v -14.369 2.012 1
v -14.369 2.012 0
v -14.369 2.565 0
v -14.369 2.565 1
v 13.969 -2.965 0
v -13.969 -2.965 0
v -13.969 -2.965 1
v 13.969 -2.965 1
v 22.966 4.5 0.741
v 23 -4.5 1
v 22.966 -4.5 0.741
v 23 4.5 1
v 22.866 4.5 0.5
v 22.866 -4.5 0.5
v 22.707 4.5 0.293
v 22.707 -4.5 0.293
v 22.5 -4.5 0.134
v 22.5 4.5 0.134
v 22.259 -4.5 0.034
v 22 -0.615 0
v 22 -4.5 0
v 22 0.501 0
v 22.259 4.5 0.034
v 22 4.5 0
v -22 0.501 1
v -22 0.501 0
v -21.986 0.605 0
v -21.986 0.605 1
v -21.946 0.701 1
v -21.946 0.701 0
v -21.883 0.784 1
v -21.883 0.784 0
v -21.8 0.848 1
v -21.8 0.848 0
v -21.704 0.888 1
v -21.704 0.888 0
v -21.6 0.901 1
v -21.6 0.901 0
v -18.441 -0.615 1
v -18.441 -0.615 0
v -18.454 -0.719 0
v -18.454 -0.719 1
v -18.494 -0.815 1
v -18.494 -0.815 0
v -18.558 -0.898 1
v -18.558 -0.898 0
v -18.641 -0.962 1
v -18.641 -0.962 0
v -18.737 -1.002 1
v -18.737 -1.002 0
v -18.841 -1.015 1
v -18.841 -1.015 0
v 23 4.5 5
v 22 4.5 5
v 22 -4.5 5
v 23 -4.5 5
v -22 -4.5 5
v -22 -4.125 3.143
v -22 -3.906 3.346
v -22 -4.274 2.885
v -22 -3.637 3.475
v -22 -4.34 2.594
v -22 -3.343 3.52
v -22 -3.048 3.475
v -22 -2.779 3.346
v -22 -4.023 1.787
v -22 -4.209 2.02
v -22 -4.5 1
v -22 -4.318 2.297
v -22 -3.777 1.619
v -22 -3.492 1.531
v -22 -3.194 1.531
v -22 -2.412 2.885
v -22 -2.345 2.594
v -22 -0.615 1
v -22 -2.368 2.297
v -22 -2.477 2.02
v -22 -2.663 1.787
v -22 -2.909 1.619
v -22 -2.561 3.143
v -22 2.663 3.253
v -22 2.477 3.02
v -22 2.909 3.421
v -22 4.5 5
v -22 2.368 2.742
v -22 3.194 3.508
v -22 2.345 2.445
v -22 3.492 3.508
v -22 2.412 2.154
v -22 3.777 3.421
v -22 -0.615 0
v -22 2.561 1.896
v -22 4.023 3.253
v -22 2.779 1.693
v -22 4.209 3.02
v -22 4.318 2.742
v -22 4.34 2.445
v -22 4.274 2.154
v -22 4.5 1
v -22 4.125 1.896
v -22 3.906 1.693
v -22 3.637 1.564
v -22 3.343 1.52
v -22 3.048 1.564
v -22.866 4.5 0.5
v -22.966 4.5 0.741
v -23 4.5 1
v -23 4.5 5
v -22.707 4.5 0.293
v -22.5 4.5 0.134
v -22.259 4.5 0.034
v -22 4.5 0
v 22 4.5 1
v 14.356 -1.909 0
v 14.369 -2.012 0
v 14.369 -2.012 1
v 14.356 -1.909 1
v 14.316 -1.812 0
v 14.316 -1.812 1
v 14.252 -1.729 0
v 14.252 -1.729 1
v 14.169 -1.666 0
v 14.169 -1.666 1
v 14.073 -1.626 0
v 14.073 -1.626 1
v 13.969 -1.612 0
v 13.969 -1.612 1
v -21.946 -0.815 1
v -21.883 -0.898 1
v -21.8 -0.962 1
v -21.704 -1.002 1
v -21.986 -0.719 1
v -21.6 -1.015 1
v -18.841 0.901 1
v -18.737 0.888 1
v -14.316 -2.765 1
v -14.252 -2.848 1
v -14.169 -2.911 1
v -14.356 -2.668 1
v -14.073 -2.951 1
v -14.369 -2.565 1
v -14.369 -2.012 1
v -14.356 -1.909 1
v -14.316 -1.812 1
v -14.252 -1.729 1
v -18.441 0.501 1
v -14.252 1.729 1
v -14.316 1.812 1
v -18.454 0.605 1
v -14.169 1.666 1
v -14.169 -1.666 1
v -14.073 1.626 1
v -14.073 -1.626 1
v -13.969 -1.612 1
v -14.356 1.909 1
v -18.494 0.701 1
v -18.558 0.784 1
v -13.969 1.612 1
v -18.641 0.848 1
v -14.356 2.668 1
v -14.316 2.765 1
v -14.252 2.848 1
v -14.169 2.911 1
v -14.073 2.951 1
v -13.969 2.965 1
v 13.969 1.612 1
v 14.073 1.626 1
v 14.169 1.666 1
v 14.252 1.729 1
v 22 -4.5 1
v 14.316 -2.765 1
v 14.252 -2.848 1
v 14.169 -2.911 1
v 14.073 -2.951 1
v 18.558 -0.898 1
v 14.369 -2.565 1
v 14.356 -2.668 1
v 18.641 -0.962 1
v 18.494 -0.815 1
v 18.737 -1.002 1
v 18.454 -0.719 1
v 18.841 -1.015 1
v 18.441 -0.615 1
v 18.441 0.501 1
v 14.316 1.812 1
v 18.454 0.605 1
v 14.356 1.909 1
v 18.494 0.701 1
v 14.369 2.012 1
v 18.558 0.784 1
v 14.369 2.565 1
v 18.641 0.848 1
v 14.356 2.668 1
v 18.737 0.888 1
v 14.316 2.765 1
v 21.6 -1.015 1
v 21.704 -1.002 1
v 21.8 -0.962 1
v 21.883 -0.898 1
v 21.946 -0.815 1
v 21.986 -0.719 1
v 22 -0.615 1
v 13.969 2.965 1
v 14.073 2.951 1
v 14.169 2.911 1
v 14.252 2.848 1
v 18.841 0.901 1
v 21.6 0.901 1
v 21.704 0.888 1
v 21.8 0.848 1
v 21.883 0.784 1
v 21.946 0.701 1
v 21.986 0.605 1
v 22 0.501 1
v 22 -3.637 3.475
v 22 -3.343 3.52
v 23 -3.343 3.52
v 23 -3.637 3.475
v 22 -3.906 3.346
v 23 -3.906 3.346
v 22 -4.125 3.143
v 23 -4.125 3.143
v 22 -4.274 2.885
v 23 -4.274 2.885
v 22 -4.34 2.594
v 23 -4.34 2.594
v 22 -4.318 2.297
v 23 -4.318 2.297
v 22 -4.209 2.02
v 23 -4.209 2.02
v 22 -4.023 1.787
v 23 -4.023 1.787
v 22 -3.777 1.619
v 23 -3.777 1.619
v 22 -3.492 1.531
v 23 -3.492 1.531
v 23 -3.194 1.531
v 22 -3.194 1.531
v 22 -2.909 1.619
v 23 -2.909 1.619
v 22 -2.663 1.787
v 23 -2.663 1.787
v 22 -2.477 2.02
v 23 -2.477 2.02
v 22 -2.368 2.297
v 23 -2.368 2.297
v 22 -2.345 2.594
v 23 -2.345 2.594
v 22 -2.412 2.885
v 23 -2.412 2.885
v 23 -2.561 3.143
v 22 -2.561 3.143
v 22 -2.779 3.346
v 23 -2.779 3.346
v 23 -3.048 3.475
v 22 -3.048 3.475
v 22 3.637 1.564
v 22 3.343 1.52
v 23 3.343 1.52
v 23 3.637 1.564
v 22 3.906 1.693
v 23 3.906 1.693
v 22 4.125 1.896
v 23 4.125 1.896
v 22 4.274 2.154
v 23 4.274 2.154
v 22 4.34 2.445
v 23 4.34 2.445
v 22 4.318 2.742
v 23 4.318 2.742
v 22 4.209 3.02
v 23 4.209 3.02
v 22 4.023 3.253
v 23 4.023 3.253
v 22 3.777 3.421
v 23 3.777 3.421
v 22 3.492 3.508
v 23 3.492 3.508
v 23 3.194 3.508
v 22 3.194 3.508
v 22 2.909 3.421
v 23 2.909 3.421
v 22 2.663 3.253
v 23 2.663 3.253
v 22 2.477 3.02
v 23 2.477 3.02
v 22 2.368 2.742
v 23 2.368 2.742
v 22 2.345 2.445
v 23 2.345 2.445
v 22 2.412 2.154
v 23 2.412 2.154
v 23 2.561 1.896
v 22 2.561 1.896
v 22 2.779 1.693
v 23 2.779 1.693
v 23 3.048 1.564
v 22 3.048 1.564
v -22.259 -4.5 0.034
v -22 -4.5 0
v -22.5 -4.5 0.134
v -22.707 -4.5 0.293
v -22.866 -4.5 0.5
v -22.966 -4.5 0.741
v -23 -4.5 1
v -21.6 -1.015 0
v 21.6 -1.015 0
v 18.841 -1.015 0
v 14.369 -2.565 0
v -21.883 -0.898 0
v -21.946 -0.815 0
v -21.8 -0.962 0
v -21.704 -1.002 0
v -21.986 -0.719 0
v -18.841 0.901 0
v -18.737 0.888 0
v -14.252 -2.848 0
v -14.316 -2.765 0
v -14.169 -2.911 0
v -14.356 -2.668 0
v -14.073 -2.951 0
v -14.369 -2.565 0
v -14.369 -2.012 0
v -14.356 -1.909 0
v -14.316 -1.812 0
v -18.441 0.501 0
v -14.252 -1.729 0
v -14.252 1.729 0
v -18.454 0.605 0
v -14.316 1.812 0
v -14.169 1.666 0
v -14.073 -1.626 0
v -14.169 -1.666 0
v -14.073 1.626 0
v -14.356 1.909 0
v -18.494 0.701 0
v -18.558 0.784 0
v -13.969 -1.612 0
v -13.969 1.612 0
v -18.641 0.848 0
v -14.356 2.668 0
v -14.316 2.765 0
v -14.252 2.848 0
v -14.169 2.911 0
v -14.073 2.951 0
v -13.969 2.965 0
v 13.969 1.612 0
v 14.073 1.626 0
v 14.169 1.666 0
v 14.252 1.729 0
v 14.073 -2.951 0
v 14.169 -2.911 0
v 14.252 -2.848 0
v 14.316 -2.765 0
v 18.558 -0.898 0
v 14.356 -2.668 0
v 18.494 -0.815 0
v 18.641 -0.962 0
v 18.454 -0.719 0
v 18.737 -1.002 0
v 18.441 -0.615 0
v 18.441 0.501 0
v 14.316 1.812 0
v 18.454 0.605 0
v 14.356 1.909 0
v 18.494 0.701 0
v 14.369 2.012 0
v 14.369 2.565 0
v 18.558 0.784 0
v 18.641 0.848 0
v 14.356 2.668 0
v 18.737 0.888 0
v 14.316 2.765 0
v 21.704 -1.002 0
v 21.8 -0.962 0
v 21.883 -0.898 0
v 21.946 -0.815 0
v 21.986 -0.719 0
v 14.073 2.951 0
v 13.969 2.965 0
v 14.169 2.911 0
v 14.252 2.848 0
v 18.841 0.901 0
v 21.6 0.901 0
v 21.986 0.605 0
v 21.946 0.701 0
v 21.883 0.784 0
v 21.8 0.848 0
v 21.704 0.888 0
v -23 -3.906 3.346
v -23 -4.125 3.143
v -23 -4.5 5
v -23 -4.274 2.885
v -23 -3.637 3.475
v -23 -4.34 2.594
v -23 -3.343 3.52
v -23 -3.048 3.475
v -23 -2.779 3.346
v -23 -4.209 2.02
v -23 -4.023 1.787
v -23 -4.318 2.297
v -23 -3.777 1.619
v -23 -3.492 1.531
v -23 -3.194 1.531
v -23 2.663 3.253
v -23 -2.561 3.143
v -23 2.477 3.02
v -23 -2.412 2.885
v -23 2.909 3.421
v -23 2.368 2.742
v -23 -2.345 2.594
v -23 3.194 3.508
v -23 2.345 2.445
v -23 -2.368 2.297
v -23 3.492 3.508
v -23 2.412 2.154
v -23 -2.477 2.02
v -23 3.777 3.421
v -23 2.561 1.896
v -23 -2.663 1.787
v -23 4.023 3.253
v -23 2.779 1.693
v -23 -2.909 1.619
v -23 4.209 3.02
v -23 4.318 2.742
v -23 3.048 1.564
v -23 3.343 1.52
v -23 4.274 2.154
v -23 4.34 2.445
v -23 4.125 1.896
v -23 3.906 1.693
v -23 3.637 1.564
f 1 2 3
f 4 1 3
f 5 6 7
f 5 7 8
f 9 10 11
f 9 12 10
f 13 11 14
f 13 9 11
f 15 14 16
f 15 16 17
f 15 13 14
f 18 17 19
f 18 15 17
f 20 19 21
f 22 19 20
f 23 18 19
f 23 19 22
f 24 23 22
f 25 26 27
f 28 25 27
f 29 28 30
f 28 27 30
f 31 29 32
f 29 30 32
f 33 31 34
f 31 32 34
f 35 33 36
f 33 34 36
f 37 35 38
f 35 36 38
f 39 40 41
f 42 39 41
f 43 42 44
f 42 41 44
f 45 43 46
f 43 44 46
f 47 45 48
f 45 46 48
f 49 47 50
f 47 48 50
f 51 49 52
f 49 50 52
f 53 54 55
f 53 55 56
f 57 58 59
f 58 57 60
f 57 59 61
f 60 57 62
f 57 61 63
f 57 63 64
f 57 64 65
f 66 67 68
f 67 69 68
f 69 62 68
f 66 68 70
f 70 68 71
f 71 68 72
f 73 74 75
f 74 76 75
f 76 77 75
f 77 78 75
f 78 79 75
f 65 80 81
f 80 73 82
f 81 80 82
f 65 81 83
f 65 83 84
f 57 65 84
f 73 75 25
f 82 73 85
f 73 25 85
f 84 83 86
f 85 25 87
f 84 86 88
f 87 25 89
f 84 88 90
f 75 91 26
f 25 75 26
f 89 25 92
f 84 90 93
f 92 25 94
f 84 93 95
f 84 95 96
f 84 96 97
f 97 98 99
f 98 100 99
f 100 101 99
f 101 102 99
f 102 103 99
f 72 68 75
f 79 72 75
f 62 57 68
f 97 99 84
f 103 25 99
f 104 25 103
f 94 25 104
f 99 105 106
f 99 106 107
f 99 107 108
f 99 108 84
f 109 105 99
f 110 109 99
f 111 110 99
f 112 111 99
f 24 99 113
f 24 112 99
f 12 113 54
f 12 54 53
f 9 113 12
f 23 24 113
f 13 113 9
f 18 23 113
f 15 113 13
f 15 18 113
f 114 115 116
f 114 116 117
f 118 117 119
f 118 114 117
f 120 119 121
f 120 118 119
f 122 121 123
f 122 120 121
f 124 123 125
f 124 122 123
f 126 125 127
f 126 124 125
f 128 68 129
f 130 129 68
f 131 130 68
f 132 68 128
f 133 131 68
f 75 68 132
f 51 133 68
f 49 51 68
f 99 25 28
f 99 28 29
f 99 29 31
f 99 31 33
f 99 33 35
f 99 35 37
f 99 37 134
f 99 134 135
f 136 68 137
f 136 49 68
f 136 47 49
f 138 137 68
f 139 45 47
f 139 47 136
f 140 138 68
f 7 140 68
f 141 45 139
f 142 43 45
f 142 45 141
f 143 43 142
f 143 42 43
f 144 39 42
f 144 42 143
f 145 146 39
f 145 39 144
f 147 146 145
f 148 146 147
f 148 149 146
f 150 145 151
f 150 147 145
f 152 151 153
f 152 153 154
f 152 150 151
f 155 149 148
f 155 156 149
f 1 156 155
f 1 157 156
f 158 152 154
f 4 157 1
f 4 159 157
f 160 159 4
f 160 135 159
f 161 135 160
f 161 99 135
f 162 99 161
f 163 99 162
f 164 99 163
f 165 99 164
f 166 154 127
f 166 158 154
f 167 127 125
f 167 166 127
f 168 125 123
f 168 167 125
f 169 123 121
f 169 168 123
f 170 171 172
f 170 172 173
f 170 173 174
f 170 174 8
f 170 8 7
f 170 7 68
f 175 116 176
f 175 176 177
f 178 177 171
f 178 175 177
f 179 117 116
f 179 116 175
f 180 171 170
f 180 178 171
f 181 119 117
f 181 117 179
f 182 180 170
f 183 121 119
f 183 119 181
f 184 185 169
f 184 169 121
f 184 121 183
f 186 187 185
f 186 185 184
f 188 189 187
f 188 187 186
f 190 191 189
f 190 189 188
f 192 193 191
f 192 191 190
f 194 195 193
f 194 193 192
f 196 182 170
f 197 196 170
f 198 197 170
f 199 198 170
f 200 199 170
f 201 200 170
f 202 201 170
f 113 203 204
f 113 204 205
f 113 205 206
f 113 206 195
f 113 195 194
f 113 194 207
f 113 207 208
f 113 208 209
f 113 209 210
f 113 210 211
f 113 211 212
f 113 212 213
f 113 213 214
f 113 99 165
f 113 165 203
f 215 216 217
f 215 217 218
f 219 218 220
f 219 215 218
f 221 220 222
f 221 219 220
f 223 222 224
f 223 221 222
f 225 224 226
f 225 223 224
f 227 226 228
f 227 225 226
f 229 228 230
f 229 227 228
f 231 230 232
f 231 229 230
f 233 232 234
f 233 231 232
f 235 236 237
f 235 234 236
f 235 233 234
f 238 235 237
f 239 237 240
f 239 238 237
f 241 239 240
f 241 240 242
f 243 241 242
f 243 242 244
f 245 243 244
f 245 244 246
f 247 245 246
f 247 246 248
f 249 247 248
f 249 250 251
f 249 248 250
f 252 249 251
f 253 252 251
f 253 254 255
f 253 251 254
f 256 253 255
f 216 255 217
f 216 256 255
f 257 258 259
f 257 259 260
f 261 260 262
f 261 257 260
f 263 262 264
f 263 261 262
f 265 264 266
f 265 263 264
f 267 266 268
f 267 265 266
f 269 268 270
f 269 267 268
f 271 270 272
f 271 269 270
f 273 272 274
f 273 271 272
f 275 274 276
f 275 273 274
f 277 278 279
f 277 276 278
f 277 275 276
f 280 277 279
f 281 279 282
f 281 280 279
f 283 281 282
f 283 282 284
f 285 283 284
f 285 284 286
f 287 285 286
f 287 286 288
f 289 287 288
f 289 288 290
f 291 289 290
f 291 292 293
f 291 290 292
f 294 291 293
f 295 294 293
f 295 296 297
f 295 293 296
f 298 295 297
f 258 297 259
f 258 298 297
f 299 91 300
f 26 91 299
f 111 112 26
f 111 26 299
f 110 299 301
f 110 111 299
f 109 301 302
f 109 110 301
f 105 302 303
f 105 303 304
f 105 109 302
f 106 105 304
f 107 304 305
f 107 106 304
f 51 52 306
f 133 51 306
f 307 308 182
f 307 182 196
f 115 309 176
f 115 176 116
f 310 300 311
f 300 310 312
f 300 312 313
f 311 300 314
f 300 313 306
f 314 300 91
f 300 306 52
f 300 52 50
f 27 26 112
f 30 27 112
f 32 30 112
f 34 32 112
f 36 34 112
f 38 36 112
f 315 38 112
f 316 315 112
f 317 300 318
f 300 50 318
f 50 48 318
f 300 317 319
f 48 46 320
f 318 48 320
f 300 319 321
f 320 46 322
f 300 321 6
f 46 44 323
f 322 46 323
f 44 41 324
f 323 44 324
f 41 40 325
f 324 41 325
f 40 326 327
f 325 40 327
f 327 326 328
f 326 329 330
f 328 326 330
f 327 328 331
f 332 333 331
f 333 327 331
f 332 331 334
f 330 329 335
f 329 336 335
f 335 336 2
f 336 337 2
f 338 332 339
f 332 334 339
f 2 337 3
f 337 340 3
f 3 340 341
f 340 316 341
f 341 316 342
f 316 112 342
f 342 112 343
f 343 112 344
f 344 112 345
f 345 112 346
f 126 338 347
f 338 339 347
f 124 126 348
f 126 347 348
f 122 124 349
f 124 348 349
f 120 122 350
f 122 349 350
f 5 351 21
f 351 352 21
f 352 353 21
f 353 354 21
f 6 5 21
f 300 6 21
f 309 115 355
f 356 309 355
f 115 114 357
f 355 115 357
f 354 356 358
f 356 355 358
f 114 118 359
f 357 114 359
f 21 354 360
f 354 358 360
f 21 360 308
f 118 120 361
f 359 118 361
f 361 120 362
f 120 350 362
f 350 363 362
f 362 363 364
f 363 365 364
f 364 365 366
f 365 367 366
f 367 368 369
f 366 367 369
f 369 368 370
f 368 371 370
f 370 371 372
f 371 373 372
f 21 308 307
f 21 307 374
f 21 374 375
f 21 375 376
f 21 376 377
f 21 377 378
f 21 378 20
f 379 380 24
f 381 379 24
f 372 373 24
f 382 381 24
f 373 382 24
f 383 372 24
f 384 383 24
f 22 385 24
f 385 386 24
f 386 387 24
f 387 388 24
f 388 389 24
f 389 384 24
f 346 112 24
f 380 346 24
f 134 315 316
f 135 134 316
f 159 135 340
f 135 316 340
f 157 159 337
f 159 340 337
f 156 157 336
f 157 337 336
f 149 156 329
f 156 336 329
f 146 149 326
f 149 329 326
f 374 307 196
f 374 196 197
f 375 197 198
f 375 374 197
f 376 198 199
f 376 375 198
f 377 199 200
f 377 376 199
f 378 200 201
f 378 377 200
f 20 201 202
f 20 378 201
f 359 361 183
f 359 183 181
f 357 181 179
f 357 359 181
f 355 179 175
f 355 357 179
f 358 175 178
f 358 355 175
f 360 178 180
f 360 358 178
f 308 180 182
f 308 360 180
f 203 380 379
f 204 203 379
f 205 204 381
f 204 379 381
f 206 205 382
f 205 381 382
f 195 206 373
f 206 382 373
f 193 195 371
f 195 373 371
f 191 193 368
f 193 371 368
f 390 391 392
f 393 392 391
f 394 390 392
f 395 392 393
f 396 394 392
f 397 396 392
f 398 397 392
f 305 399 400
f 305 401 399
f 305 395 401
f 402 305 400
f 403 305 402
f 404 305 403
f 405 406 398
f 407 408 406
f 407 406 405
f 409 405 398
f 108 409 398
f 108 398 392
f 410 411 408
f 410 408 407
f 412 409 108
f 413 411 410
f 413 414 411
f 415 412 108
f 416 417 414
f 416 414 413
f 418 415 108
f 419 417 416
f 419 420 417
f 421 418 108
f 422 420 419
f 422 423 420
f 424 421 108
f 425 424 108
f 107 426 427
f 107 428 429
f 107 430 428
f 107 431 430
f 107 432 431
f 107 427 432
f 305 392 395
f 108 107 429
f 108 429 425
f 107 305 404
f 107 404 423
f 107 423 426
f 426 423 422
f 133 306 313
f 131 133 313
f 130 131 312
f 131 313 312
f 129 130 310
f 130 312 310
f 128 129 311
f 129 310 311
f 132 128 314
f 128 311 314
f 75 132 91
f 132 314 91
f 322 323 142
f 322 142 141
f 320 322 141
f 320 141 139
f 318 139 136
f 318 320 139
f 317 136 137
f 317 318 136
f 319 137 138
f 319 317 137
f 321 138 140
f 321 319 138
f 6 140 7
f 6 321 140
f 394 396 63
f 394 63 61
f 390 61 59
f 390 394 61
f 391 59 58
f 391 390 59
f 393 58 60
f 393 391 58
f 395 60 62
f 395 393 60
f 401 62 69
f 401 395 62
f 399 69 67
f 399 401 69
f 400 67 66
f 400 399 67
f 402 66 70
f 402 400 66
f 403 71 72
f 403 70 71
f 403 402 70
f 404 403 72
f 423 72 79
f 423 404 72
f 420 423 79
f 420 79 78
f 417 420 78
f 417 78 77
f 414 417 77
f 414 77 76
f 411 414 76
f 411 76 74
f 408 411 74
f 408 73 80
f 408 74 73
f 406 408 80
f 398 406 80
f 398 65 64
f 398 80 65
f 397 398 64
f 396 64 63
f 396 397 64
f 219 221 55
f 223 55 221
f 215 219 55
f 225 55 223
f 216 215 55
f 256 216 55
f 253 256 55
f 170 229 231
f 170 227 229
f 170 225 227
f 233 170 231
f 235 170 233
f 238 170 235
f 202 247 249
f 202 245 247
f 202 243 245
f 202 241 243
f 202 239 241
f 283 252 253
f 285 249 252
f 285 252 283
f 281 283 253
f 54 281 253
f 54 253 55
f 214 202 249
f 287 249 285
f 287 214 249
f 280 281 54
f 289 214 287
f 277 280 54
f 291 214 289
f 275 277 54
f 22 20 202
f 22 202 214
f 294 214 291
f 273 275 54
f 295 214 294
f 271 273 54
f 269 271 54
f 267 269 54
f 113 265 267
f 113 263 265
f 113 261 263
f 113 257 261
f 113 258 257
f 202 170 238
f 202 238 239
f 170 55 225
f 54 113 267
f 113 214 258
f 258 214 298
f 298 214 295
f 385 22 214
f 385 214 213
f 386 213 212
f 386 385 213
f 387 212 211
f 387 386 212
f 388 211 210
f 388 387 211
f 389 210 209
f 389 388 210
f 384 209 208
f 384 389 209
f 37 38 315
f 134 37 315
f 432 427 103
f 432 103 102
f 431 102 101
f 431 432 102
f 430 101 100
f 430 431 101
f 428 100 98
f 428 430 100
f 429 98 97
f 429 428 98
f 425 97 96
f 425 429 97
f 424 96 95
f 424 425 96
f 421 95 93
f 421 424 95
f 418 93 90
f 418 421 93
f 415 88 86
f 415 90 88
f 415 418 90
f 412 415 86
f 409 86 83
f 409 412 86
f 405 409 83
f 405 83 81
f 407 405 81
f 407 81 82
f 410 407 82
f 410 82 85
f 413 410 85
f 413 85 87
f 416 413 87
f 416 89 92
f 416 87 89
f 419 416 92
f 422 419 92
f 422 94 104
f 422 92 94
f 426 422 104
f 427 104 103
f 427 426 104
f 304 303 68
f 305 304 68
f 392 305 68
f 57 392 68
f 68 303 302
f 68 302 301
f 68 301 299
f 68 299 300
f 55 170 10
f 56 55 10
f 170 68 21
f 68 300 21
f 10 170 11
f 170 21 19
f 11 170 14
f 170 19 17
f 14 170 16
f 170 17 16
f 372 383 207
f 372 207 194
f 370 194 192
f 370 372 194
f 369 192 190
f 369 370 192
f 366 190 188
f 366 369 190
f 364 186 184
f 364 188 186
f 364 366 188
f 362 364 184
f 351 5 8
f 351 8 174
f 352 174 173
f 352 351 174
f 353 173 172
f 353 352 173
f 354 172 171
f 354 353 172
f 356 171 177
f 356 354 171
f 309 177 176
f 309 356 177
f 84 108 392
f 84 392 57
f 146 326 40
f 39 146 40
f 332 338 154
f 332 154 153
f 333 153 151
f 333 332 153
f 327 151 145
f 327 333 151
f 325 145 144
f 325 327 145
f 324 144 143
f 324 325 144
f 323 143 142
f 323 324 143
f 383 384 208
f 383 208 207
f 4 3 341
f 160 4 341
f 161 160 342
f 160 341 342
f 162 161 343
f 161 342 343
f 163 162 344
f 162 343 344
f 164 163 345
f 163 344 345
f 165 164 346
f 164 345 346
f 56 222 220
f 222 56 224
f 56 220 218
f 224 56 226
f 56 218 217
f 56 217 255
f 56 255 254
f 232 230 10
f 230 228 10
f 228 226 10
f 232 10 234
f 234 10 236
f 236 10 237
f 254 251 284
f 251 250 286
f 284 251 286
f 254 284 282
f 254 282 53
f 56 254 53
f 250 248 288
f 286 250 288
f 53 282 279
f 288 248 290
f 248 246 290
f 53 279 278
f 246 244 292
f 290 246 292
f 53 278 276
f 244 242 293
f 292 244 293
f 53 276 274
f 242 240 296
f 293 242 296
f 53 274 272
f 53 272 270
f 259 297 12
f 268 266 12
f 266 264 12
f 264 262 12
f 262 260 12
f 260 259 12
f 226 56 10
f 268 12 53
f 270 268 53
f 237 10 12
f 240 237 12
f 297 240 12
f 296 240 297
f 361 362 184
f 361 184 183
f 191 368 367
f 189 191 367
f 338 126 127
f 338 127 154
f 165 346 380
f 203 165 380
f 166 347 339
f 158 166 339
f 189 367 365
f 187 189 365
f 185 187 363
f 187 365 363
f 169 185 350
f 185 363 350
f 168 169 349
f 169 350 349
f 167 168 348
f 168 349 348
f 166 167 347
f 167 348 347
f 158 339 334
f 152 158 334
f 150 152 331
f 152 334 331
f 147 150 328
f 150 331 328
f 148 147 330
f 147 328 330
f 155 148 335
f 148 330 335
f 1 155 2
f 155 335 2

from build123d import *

# Parameters (mm, degrees)
SKETCH1_W               = 46
SKETCH1_H               = 9
BOSS_EXTRUDE1_DEPTH     = 1
SKETCH2_W               = 1
SKETCH2_H               = 9
BOSS_EXTRUDE2_DEPTH     = 4
CUT_EXTRUDE1_DEPTH      = 47.489246068
CUT_EXTRUDE1_DEPTH_BACK = 47.489246068
SKETCH3_R               = 1
FILLET1_R               = 1
CUT_EXTRUDE2_DEPTH      = 4


with BuildPart() as part:
    # Sketch1 → Boss-Extrude1 (new body)
    with BuildSketch(Plane.XY):
        Rectangle(SKETCH1_W, SKETCH1_H)
    extrude(amount=BOSS_EXTRUDE1_DEPTH)

    # Sketch2 → Boss-Extrude2 (add)
    with BuildSketch(Plane.XY.offset(1)):
        with Locations((22.5, 0)):
            Rectangle(SKETCH2_W, SKETCH2_H)
        with Locations((-22.5, 0)):
            Rectangle(SKETCH2_W, SKETCH2_H)
    extrude(amount=BOSS_EXTRUDE2_DEPTH)

    # Sketch3 → Cut-Extrude1 (cut, two sides: drawn at the far end of the back side and taken through both)
    with BuildSketch(Plane(origin=(23, 0, 0), x_dir=(0, 0, -1), z_dir=(1, 0, 0)).offset(-CUT_EXTRUDE1_DEPTH_BACK)):
        with Locations((-2.519595735, 3.342695185)):
            Circle(SKETCH3_R)
        with Locations(Location((-2.519595735, -3.342695185, 0), (0, 0, 180))):
            Circle(SKETCH3_R)
    extrude(amount=CUT_EXTRUDE1_DEPTH + CUT_EXTRUDE1_DEPTH_BACK, mode=Mode.SUBTRACT)

    # Fillet1
    fillet1_edges = [part.edges().sort_by_distance(p)[0] for p in [
        (23, 0, 0),
        (-23, 0, 0),
    ]]
    fillet(fillet1_edges, radius=FILLET1_R)

    # Sketch4 → Cut-Extrude2 (cut)
    with BuildSketch(Plane(origin=(0, 0, 0), x_dir=(-1, 0, 0), z_dir=(0, 0, -1))):
        with BuildLine():
            Line((-13.969166326, 1.612266409), (13.969166326, 1.612266409))
            ThreePointArc((13.969166326, 1.612266409), (14.252009038, 1.729423696), (14.369166326, 2.012266409))
            Line((14.369166326, 2.012266409), (14.369166326, 2.564662734))
            ThreePointArc((14.369166326, 2.564662734), (14.252009038, 2.847505447), (13.969166326, 2.964662734))
            Line((13.969166326, 2.964662734), (-13.969166326, 2.964662734))
            ThreePointArc((-13.969166326, 2.964662734), (-14.252009038, 2.847505447), (-14.369166326, 2.564662734))
            Line((-14.369166326, 2.564662734), (-14.369166326, 2.012266409))
            ThreePointArc((-14.369166326, 2.012266409), (-14.252009038, 1.729423696), (-13.969166326, 1.612266409))
        make_face()
        with BuildLine():
            Line((14.369166326, -2.012266409), (14.369166326, -2.564662734))
            ThreePointArc((14.369166326, -2.564662734), (14.252009038, -2.847505447), (13.969166326, -2.964662734))
            Line((13.969166326, -2.964662734), (-13.969166326, -2.964662734))
            ThreePointArc((-13.969166326, -2.964662734), (-14.252009038, -2.847505447), (-14.369166326, -2.564662734))
            Line((-14.369166326, -2.564662734), (-14.369166326, -2.012266409))
            ThreePointArc((-14.369166326, -2.012266409), (-14.252009038, -1.729423696), (-13.969166326, -1.612266409))
            Line((-13.969166326, -1.612266409), (13.969166326, -1.612266409))
            ThreePointArc((13.969166326, -1.612266409), (14.252009038, -1.729423696), (14.369166326, -2.012266409))
        make_face()
        with BuildLine():
            Line((-21.6, 0.901467355), (-18.840541252, 0.901467355))
            ThreePointArc((-18.840541252, 0.901467355), (-18.55769854, 0.784310067), (-18.440541252, 0.501467355))
            Line((-18.440541252, 0.501467355), (-18.440541252, -0.615256763))
            ThreePointArc((-18.440541252, -0.615256763), (-18.55769854, -0.898099475), (-18.840541252, -1.015256763))
            Line((-18.840541252, -1.015256763), (-21.6, -1.015256763))
            ThreePointArc((-21.6, -1.015256763), (-21.882842712, -0.898099475), (-22, -0.615256763))
            Line((-22, -0.615256763), (-22, 0.501467355))
            ThreePointArc((-22, 0.501467355), (-21.882842712, 0.784310067), (-21.6, 0.901467355))
        make_face()
        with BuildLine():
            Line((18.440541252, 0.501467355), (18.440541252, -0.615256763))
            ThreePointArc((18.440541252, -0.615256763), (18.55769854, -0.898099475), (18.840541252, -1.015256763))
            Line((18.840541252, -1.015256763), (21.6, -1.015256763))
            ThreePointArc((21.6, -1.015256763), (21.882842712, -0.898099475), (22, -0.615256763))
            Line((22, -0.615256763), (22, 0.501467355))
            ThreePointArc((22, 0.501467355), (21.882842712, 0.784310067), (21.6, 0.901467355))
            Line((21.6, 0.901467355), (18.840541252, 0.901467355))
            ThreePointArc((18.840541252, 0.901467355), (18.55769854, 0.784310067), (18.440541252, 0.501467355))
        make_face()
    extrude(amount=-CUT_EXTRUDE2_DEPTH, mode=Mode.SUBTRACT)


solid = part.part
